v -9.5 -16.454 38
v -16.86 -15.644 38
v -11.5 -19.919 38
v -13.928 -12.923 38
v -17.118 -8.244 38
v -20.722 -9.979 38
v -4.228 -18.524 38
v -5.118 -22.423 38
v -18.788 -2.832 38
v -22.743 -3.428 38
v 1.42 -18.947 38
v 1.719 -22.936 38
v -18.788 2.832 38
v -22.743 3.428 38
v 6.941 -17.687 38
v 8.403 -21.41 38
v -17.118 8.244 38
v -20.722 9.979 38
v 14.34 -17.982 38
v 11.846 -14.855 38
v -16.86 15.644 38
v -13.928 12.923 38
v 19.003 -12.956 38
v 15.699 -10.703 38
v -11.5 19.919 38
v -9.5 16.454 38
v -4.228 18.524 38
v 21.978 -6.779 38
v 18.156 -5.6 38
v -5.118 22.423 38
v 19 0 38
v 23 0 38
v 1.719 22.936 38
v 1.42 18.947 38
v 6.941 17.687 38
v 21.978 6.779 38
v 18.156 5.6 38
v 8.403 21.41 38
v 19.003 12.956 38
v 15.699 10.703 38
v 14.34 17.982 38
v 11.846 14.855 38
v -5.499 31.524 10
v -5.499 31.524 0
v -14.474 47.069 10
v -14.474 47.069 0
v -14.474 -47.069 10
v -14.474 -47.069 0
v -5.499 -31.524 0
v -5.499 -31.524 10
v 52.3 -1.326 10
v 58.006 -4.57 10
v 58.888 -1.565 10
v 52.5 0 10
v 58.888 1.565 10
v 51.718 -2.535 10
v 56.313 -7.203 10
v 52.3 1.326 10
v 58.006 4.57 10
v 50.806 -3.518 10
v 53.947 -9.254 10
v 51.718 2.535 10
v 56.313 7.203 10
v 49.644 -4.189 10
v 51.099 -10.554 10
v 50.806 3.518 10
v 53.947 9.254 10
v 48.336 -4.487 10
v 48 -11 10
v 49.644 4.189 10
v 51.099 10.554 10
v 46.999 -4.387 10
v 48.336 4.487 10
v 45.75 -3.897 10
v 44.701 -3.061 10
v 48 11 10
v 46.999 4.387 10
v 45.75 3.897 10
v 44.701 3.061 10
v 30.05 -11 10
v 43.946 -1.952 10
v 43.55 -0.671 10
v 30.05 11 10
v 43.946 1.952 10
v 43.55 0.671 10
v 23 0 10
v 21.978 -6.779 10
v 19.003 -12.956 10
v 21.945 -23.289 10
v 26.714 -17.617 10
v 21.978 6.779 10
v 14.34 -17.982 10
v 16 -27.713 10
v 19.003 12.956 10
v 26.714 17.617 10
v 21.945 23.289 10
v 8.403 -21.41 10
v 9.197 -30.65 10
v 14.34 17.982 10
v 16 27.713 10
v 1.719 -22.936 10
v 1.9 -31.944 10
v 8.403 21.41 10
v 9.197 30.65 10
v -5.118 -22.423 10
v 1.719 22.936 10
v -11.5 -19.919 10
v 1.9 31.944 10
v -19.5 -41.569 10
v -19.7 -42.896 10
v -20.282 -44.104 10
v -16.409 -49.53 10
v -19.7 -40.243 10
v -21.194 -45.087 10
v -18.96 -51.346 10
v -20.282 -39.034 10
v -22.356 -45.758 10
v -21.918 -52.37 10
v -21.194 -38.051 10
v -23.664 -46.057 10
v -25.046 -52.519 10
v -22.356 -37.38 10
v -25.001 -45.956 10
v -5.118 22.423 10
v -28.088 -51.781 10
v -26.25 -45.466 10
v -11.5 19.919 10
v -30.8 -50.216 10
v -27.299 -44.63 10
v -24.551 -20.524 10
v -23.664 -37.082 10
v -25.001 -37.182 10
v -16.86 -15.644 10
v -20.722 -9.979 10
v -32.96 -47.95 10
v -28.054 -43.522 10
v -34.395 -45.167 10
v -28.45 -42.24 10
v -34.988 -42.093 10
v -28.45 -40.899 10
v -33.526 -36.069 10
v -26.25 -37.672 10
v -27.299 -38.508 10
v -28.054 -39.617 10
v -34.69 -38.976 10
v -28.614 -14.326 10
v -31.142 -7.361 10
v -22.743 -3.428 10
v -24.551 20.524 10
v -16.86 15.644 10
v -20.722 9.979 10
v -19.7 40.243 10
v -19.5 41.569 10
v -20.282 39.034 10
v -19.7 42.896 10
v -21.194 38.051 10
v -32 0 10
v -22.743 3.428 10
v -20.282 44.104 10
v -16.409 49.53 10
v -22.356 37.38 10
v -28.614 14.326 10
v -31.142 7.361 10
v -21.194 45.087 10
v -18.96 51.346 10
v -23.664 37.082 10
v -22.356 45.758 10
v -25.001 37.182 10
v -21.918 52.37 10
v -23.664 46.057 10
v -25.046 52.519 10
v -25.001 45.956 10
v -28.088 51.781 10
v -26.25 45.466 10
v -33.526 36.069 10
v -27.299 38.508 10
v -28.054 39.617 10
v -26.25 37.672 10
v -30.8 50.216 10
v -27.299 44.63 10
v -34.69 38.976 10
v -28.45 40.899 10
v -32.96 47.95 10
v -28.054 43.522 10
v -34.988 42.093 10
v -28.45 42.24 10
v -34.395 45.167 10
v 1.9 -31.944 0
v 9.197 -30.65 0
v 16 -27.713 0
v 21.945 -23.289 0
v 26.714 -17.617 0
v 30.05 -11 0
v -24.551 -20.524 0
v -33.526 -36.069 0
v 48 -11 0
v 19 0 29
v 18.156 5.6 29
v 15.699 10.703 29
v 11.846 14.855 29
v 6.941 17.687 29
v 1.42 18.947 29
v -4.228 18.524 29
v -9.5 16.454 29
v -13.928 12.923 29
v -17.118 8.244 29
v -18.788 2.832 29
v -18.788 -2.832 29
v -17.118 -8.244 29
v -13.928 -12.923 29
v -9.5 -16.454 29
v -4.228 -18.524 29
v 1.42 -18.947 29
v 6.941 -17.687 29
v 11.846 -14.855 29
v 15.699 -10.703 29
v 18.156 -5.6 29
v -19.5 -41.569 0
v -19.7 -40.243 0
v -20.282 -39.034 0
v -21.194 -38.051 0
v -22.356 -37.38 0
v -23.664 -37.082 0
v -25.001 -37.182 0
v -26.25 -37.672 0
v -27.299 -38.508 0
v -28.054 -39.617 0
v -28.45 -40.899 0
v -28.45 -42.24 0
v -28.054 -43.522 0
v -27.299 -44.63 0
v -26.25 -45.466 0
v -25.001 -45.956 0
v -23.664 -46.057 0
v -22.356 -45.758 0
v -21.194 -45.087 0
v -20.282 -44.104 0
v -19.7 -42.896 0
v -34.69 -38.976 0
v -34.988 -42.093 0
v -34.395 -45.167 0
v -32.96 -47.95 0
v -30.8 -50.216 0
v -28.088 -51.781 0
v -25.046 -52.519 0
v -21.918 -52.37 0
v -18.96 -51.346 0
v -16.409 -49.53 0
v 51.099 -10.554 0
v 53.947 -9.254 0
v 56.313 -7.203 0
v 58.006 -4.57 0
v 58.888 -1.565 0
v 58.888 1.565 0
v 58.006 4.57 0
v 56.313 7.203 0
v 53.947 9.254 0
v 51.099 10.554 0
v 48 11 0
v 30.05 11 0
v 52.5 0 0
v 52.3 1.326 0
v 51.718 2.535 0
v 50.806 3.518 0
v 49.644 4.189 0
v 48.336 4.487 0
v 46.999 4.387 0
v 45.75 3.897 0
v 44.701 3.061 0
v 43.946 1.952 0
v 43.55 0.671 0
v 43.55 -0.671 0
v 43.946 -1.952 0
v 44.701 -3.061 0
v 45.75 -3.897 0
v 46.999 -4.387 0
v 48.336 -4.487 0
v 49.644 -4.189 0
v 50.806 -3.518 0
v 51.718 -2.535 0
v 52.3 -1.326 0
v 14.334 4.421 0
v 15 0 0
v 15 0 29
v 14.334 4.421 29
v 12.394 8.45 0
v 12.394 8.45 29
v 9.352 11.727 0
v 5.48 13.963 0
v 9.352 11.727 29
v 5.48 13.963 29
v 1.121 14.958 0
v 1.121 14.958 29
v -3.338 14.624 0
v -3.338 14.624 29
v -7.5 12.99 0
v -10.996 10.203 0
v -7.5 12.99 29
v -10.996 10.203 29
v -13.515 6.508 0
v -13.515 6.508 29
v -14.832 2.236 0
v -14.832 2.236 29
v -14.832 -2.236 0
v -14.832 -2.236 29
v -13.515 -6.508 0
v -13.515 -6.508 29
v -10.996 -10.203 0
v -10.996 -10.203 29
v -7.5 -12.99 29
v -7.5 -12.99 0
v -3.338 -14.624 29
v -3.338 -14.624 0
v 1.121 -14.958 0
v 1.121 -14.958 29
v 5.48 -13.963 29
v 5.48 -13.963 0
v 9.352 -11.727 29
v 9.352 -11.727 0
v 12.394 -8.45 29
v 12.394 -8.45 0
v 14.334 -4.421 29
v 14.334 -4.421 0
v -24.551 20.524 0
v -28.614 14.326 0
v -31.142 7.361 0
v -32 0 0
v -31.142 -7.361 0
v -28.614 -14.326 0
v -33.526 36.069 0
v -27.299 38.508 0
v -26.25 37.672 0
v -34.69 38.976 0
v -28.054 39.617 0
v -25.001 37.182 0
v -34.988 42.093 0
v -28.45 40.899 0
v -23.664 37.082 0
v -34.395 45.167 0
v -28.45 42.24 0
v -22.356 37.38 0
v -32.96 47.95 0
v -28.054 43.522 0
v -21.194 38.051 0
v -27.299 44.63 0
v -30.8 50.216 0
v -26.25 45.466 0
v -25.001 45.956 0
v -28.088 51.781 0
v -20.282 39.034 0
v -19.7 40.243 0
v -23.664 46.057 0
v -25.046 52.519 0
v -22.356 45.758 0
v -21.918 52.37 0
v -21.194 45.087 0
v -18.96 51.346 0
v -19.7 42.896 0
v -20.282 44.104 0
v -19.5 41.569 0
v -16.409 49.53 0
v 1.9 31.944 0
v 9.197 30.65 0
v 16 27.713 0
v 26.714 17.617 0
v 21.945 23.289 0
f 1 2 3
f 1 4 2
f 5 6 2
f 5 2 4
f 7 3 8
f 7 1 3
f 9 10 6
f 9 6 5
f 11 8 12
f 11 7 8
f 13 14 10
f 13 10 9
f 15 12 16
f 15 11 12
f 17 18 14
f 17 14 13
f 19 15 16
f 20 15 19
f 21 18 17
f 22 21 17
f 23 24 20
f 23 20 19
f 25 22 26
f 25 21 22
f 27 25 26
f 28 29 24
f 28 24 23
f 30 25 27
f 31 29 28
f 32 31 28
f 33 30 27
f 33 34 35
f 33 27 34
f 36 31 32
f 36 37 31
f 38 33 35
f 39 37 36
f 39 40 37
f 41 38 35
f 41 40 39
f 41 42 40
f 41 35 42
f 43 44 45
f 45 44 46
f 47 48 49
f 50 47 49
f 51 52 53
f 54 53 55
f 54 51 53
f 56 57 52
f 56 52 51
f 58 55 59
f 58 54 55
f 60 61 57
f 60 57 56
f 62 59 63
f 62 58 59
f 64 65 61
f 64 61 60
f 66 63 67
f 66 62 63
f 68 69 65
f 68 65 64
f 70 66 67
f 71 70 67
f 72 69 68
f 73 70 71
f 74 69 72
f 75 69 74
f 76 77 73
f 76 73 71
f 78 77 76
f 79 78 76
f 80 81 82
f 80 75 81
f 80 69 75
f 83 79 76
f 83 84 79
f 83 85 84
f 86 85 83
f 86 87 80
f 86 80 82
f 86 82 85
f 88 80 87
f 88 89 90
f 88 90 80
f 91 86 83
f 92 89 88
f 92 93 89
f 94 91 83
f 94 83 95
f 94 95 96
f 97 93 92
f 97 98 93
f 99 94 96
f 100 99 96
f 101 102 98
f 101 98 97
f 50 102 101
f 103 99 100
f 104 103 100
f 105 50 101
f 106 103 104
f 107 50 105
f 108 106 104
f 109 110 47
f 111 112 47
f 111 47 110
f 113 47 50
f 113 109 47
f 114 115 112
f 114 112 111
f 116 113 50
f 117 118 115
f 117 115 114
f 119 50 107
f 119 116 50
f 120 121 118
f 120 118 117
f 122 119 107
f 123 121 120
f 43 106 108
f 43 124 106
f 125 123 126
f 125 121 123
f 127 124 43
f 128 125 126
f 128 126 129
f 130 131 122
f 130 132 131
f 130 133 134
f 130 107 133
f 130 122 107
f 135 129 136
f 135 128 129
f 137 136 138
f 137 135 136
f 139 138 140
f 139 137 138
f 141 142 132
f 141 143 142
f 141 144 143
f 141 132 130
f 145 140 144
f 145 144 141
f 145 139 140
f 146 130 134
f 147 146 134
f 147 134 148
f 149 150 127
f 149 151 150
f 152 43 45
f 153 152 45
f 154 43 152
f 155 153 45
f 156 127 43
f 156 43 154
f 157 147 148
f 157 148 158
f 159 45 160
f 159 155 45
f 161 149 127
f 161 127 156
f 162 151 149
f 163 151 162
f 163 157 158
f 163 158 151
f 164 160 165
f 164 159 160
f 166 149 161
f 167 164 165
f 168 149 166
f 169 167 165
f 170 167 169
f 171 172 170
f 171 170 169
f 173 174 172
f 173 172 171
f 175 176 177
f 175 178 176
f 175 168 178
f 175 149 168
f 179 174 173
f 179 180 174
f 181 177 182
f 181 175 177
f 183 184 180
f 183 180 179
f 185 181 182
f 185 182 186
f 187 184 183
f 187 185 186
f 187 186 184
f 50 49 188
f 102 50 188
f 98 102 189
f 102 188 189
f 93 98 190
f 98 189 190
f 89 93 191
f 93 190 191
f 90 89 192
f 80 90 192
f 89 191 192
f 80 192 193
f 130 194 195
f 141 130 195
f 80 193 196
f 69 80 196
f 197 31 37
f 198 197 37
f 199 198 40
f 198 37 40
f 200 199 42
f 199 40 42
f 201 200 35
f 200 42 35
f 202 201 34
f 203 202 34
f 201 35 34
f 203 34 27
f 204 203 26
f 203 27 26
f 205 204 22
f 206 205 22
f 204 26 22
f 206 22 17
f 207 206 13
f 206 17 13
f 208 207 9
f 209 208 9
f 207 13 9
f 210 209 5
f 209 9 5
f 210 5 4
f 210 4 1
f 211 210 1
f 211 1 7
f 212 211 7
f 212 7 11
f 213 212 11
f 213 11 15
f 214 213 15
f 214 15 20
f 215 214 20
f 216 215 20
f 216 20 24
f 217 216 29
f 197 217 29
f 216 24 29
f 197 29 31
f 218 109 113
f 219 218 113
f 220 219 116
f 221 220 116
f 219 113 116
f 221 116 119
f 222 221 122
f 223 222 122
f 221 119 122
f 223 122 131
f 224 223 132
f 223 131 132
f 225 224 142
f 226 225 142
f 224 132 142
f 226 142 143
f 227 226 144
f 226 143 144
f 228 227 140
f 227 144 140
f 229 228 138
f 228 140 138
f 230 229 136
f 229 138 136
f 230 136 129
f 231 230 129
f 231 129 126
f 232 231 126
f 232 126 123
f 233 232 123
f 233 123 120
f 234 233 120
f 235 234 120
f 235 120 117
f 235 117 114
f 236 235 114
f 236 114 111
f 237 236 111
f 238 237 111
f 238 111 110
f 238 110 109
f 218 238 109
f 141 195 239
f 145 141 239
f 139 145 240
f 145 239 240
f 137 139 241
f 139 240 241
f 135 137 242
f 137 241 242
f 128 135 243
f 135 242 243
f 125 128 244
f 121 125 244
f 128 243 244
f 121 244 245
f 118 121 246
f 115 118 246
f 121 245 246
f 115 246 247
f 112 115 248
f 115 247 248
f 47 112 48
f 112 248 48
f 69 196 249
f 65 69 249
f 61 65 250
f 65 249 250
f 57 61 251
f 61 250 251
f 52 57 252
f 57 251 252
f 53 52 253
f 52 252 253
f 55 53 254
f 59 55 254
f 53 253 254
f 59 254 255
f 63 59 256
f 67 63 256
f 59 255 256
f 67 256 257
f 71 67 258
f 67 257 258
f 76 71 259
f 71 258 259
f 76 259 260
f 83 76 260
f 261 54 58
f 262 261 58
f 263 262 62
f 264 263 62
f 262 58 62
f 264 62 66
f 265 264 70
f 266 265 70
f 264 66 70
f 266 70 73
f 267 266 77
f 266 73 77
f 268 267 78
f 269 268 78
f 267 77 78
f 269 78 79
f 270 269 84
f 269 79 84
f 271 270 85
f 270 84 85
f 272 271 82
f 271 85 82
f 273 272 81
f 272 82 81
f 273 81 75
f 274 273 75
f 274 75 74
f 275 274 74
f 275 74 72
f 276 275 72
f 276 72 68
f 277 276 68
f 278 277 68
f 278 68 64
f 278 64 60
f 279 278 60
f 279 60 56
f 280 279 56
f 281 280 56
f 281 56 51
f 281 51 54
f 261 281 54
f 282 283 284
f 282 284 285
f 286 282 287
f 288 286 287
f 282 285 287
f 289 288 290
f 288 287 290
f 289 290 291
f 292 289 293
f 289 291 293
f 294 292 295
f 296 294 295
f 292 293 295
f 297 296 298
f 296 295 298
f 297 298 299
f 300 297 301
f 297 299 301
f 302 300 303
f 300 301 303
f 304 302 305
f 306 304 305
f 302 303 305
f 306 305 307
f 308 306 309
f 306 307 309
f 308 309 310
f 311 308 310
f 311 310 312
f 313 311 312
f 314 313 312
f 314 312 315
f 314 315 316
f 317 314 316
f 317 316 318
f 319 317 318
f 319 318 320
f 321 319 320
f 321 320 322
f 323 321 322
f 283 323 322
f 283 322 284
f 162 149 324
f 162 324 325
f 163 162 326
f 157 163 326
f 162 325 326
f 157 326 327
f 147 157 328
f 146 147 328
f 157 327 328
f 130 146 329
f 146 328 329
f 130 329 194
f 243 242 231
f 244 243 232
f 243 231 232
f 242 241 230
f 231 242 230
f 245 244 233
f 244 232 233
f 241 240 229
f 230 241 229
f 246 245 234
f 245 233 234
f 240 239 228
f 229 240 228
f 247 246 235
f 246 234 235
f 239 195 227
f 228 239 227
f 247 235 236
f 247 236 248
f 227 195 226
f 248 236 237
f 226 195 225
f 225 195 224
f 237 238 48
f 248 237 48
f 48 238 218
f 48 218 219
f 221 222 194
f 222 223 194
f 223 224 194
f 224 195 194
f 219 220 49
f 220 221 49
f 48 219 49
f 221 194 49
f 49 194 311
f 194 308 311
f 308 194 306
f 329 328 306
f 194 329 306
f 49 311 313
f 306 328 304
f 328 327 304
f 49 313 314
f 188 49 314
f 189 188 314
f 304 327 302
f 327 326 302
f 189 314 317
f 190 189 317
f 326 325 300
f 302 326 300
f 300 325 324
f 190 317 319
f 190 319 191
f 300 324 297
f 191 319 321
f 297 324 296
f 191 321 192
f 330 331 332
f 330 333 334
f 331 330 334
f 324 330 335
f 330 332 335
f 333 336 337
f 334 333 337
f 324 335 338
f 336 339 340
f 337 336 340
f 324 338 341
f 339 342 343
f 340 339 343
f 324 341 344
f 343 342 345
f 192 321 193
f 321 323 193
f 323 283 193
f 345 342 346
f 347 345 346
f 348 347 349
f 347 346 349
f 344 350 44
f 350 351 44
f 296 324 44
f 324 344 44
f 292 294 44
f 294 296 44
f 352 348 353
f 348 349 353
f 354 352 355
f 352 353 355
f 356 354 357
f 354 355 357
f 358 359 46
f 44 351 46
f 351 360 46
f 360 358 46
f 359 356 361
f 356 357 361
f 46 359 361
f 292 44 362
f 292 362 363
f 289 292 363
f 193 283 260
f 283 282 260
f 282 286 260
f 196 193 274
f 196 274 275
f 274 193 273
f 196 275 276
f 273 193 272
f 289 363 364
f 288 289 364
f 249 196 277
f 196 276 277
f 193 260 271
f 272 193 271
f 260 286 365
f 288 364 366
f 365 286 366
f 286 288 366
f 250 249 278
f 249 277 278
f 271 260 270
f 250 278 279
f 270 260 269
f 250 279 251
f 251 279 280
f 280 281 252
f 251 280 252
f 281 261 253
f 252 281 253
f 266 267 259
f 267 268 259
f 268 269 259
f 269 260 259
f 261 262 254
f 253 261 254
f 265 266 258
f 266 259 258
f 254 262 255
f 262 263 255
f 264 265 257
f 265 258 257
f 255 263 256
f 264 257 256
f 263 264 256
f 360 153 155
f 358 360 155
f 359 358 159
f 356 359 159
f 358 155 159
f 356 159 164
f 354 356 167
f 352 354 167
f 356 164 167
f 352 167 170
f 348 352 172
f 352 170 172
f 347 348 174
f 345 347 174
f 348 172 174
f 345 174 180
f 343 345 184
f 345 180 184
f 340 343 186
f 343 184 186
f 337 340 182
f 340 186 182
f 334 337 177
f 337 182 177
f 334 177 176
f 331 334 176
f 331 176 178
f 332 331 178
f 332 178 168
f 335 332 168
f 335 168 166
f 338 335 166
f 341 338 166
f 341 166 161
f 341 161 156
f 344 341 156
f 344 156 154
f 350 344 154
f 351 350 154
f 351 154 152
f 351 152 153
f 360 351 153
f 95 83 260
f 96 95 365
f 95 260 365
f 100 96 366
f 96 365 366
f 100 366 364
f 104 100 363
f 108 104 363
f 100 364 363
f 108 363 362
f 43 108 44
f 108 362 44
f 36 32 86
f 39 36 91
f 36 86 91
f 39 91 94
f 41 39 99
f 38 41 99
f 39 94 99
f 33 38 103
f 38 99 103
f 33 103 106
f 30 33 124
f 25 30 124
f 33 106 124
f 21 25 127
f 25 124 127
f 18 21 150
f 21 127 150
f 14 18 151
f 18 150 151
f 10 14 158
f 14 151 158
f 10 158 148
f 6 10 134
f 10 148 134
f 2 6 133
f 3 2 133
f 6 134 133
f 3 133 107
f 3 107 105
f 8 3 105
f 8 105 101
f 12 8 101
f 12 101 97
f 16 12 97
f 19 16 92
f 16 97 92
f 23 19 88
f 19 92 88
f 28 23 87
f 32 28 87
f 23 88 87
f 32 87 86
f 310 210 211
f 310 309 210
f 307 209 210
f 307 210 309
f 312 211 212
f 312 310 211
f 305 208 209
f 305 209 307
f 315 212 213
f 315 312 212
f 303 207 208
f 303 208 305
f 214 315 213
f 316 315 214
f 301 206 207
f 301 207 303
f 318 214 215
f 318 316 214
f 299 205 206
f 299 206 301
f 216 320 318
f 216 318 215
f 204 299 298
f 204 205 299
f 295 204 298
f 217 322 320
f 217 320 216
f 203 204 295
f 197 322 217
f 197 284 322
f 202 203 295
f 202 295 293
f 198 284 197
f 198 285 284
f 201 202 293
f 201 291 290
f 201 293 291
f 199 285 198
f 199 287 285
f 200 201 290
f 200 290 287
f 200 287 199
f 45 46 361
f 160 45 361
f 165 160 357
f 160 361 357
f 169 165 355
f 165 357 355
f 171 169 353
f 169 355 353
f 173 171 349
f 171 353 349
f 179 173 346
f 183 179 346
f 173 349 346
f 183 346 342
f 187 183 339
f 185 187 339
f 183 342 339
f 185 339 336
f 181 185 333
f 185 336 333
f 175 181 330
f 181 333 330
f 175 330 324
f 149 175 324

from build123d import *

# Parameters (mm, degrees)
SKETCH_1_R               = 32
EXTRUDE_1_DEPTH          = 10
EXTRUDE_2_DEPTH          = 10
PATTERN_CIRCULAR_1_COUNT = 3
SKETCH_3_R               = 23
EXTRUDE_3_DEPTH          = 28
SKETCH_4_R               = 15
CUT_EXTRUDE_1_DEPTH      = 88.68422222
SKETCH_5_R               = 19
CUT_EXTRUDE_2_DEPTH      = 9
SKETCH_6_R               = 4.5
CUT_EXTRUDE_3_DEPTH      = 84.836285858


with BuildPart() as part:
    # 草图1 → 凸台-拉伸1 (new body)
    with BuildSketch(Plane.XY):
        Circle(SKETCH_1_R)
    extrude(amount=EXTRUDE_1_DEPTH)

    # 草图2 → 凸台-拉伸2 (add)
    with BuildSketch(Plane.XY):
        with BuildLine():
            Line((20, -11), (48, -11))
            ThreePointArc((48, -11), (59, 0), (48, 11))
            Line((48, 11), (20, 11))
            ThreePointArc((20, 11), (9, 0), (20, -11))
        make_face()
    extrude_2 = extrude(amount=EXTRUDE_2_DEPTH)

    # 阵列(圆周)1: 凸台-拉伸2 ×3 about axis
    pattern_circular_1_axis = Axis((0, 0, 10.5), (0, 0, -1))
    for i in range(1, PATTERN_CIRCULAR_1_COUNT):
        add(extrude_2.rotate(pattern_circular_1_axis, i * 360 / PATTERN_CIRCULAR_1_COUNT))

    # 草图3 → 凸台-拉伸3 (add)
    with BuildSketch(Plane.XY.offset(10)):
        Circle(SKETCH_3_R)
    extrude(amount=EXTRUDE_3_DEPTH)

    # 草图4 → 切除-拉伸1 (cut, through all)
    with BuildSketch(Plane.XY.offset(38)):
        Circle(SKETCH_4_R)
    extrude(amount=-CUT_EXTRUDE_1_DEPTH, mode=Mode.SUBTRACT)

    # 草图5 → 切除-拉伸2 (cut)
    with BuildSketch(Plane.XY.offset(38)):
        Circle(SKETCH_5_R)
    extrude(amount=-CUT_EXTRUDE_2_DEPTH, mode=Mode.SUBTRACT)

    # 草图6 → 切除-拉伸3 (cut, through all)
    with BuildSketch(Plane.XY.offset(10)):
        with Locations((48, 0)):
            Circle(SKETCH_6_R)
        with Locations((-24, 41.569219)):
            Circle(SKETCH_6_R)
        with Locations((-24, -41.569219)):
            Circle(SKETCH_6_R)
    extrude(amount=-CUT_EXTRUDE_3_DEPTH, mode=Mode.SUBTRACT)


solid = part.part
